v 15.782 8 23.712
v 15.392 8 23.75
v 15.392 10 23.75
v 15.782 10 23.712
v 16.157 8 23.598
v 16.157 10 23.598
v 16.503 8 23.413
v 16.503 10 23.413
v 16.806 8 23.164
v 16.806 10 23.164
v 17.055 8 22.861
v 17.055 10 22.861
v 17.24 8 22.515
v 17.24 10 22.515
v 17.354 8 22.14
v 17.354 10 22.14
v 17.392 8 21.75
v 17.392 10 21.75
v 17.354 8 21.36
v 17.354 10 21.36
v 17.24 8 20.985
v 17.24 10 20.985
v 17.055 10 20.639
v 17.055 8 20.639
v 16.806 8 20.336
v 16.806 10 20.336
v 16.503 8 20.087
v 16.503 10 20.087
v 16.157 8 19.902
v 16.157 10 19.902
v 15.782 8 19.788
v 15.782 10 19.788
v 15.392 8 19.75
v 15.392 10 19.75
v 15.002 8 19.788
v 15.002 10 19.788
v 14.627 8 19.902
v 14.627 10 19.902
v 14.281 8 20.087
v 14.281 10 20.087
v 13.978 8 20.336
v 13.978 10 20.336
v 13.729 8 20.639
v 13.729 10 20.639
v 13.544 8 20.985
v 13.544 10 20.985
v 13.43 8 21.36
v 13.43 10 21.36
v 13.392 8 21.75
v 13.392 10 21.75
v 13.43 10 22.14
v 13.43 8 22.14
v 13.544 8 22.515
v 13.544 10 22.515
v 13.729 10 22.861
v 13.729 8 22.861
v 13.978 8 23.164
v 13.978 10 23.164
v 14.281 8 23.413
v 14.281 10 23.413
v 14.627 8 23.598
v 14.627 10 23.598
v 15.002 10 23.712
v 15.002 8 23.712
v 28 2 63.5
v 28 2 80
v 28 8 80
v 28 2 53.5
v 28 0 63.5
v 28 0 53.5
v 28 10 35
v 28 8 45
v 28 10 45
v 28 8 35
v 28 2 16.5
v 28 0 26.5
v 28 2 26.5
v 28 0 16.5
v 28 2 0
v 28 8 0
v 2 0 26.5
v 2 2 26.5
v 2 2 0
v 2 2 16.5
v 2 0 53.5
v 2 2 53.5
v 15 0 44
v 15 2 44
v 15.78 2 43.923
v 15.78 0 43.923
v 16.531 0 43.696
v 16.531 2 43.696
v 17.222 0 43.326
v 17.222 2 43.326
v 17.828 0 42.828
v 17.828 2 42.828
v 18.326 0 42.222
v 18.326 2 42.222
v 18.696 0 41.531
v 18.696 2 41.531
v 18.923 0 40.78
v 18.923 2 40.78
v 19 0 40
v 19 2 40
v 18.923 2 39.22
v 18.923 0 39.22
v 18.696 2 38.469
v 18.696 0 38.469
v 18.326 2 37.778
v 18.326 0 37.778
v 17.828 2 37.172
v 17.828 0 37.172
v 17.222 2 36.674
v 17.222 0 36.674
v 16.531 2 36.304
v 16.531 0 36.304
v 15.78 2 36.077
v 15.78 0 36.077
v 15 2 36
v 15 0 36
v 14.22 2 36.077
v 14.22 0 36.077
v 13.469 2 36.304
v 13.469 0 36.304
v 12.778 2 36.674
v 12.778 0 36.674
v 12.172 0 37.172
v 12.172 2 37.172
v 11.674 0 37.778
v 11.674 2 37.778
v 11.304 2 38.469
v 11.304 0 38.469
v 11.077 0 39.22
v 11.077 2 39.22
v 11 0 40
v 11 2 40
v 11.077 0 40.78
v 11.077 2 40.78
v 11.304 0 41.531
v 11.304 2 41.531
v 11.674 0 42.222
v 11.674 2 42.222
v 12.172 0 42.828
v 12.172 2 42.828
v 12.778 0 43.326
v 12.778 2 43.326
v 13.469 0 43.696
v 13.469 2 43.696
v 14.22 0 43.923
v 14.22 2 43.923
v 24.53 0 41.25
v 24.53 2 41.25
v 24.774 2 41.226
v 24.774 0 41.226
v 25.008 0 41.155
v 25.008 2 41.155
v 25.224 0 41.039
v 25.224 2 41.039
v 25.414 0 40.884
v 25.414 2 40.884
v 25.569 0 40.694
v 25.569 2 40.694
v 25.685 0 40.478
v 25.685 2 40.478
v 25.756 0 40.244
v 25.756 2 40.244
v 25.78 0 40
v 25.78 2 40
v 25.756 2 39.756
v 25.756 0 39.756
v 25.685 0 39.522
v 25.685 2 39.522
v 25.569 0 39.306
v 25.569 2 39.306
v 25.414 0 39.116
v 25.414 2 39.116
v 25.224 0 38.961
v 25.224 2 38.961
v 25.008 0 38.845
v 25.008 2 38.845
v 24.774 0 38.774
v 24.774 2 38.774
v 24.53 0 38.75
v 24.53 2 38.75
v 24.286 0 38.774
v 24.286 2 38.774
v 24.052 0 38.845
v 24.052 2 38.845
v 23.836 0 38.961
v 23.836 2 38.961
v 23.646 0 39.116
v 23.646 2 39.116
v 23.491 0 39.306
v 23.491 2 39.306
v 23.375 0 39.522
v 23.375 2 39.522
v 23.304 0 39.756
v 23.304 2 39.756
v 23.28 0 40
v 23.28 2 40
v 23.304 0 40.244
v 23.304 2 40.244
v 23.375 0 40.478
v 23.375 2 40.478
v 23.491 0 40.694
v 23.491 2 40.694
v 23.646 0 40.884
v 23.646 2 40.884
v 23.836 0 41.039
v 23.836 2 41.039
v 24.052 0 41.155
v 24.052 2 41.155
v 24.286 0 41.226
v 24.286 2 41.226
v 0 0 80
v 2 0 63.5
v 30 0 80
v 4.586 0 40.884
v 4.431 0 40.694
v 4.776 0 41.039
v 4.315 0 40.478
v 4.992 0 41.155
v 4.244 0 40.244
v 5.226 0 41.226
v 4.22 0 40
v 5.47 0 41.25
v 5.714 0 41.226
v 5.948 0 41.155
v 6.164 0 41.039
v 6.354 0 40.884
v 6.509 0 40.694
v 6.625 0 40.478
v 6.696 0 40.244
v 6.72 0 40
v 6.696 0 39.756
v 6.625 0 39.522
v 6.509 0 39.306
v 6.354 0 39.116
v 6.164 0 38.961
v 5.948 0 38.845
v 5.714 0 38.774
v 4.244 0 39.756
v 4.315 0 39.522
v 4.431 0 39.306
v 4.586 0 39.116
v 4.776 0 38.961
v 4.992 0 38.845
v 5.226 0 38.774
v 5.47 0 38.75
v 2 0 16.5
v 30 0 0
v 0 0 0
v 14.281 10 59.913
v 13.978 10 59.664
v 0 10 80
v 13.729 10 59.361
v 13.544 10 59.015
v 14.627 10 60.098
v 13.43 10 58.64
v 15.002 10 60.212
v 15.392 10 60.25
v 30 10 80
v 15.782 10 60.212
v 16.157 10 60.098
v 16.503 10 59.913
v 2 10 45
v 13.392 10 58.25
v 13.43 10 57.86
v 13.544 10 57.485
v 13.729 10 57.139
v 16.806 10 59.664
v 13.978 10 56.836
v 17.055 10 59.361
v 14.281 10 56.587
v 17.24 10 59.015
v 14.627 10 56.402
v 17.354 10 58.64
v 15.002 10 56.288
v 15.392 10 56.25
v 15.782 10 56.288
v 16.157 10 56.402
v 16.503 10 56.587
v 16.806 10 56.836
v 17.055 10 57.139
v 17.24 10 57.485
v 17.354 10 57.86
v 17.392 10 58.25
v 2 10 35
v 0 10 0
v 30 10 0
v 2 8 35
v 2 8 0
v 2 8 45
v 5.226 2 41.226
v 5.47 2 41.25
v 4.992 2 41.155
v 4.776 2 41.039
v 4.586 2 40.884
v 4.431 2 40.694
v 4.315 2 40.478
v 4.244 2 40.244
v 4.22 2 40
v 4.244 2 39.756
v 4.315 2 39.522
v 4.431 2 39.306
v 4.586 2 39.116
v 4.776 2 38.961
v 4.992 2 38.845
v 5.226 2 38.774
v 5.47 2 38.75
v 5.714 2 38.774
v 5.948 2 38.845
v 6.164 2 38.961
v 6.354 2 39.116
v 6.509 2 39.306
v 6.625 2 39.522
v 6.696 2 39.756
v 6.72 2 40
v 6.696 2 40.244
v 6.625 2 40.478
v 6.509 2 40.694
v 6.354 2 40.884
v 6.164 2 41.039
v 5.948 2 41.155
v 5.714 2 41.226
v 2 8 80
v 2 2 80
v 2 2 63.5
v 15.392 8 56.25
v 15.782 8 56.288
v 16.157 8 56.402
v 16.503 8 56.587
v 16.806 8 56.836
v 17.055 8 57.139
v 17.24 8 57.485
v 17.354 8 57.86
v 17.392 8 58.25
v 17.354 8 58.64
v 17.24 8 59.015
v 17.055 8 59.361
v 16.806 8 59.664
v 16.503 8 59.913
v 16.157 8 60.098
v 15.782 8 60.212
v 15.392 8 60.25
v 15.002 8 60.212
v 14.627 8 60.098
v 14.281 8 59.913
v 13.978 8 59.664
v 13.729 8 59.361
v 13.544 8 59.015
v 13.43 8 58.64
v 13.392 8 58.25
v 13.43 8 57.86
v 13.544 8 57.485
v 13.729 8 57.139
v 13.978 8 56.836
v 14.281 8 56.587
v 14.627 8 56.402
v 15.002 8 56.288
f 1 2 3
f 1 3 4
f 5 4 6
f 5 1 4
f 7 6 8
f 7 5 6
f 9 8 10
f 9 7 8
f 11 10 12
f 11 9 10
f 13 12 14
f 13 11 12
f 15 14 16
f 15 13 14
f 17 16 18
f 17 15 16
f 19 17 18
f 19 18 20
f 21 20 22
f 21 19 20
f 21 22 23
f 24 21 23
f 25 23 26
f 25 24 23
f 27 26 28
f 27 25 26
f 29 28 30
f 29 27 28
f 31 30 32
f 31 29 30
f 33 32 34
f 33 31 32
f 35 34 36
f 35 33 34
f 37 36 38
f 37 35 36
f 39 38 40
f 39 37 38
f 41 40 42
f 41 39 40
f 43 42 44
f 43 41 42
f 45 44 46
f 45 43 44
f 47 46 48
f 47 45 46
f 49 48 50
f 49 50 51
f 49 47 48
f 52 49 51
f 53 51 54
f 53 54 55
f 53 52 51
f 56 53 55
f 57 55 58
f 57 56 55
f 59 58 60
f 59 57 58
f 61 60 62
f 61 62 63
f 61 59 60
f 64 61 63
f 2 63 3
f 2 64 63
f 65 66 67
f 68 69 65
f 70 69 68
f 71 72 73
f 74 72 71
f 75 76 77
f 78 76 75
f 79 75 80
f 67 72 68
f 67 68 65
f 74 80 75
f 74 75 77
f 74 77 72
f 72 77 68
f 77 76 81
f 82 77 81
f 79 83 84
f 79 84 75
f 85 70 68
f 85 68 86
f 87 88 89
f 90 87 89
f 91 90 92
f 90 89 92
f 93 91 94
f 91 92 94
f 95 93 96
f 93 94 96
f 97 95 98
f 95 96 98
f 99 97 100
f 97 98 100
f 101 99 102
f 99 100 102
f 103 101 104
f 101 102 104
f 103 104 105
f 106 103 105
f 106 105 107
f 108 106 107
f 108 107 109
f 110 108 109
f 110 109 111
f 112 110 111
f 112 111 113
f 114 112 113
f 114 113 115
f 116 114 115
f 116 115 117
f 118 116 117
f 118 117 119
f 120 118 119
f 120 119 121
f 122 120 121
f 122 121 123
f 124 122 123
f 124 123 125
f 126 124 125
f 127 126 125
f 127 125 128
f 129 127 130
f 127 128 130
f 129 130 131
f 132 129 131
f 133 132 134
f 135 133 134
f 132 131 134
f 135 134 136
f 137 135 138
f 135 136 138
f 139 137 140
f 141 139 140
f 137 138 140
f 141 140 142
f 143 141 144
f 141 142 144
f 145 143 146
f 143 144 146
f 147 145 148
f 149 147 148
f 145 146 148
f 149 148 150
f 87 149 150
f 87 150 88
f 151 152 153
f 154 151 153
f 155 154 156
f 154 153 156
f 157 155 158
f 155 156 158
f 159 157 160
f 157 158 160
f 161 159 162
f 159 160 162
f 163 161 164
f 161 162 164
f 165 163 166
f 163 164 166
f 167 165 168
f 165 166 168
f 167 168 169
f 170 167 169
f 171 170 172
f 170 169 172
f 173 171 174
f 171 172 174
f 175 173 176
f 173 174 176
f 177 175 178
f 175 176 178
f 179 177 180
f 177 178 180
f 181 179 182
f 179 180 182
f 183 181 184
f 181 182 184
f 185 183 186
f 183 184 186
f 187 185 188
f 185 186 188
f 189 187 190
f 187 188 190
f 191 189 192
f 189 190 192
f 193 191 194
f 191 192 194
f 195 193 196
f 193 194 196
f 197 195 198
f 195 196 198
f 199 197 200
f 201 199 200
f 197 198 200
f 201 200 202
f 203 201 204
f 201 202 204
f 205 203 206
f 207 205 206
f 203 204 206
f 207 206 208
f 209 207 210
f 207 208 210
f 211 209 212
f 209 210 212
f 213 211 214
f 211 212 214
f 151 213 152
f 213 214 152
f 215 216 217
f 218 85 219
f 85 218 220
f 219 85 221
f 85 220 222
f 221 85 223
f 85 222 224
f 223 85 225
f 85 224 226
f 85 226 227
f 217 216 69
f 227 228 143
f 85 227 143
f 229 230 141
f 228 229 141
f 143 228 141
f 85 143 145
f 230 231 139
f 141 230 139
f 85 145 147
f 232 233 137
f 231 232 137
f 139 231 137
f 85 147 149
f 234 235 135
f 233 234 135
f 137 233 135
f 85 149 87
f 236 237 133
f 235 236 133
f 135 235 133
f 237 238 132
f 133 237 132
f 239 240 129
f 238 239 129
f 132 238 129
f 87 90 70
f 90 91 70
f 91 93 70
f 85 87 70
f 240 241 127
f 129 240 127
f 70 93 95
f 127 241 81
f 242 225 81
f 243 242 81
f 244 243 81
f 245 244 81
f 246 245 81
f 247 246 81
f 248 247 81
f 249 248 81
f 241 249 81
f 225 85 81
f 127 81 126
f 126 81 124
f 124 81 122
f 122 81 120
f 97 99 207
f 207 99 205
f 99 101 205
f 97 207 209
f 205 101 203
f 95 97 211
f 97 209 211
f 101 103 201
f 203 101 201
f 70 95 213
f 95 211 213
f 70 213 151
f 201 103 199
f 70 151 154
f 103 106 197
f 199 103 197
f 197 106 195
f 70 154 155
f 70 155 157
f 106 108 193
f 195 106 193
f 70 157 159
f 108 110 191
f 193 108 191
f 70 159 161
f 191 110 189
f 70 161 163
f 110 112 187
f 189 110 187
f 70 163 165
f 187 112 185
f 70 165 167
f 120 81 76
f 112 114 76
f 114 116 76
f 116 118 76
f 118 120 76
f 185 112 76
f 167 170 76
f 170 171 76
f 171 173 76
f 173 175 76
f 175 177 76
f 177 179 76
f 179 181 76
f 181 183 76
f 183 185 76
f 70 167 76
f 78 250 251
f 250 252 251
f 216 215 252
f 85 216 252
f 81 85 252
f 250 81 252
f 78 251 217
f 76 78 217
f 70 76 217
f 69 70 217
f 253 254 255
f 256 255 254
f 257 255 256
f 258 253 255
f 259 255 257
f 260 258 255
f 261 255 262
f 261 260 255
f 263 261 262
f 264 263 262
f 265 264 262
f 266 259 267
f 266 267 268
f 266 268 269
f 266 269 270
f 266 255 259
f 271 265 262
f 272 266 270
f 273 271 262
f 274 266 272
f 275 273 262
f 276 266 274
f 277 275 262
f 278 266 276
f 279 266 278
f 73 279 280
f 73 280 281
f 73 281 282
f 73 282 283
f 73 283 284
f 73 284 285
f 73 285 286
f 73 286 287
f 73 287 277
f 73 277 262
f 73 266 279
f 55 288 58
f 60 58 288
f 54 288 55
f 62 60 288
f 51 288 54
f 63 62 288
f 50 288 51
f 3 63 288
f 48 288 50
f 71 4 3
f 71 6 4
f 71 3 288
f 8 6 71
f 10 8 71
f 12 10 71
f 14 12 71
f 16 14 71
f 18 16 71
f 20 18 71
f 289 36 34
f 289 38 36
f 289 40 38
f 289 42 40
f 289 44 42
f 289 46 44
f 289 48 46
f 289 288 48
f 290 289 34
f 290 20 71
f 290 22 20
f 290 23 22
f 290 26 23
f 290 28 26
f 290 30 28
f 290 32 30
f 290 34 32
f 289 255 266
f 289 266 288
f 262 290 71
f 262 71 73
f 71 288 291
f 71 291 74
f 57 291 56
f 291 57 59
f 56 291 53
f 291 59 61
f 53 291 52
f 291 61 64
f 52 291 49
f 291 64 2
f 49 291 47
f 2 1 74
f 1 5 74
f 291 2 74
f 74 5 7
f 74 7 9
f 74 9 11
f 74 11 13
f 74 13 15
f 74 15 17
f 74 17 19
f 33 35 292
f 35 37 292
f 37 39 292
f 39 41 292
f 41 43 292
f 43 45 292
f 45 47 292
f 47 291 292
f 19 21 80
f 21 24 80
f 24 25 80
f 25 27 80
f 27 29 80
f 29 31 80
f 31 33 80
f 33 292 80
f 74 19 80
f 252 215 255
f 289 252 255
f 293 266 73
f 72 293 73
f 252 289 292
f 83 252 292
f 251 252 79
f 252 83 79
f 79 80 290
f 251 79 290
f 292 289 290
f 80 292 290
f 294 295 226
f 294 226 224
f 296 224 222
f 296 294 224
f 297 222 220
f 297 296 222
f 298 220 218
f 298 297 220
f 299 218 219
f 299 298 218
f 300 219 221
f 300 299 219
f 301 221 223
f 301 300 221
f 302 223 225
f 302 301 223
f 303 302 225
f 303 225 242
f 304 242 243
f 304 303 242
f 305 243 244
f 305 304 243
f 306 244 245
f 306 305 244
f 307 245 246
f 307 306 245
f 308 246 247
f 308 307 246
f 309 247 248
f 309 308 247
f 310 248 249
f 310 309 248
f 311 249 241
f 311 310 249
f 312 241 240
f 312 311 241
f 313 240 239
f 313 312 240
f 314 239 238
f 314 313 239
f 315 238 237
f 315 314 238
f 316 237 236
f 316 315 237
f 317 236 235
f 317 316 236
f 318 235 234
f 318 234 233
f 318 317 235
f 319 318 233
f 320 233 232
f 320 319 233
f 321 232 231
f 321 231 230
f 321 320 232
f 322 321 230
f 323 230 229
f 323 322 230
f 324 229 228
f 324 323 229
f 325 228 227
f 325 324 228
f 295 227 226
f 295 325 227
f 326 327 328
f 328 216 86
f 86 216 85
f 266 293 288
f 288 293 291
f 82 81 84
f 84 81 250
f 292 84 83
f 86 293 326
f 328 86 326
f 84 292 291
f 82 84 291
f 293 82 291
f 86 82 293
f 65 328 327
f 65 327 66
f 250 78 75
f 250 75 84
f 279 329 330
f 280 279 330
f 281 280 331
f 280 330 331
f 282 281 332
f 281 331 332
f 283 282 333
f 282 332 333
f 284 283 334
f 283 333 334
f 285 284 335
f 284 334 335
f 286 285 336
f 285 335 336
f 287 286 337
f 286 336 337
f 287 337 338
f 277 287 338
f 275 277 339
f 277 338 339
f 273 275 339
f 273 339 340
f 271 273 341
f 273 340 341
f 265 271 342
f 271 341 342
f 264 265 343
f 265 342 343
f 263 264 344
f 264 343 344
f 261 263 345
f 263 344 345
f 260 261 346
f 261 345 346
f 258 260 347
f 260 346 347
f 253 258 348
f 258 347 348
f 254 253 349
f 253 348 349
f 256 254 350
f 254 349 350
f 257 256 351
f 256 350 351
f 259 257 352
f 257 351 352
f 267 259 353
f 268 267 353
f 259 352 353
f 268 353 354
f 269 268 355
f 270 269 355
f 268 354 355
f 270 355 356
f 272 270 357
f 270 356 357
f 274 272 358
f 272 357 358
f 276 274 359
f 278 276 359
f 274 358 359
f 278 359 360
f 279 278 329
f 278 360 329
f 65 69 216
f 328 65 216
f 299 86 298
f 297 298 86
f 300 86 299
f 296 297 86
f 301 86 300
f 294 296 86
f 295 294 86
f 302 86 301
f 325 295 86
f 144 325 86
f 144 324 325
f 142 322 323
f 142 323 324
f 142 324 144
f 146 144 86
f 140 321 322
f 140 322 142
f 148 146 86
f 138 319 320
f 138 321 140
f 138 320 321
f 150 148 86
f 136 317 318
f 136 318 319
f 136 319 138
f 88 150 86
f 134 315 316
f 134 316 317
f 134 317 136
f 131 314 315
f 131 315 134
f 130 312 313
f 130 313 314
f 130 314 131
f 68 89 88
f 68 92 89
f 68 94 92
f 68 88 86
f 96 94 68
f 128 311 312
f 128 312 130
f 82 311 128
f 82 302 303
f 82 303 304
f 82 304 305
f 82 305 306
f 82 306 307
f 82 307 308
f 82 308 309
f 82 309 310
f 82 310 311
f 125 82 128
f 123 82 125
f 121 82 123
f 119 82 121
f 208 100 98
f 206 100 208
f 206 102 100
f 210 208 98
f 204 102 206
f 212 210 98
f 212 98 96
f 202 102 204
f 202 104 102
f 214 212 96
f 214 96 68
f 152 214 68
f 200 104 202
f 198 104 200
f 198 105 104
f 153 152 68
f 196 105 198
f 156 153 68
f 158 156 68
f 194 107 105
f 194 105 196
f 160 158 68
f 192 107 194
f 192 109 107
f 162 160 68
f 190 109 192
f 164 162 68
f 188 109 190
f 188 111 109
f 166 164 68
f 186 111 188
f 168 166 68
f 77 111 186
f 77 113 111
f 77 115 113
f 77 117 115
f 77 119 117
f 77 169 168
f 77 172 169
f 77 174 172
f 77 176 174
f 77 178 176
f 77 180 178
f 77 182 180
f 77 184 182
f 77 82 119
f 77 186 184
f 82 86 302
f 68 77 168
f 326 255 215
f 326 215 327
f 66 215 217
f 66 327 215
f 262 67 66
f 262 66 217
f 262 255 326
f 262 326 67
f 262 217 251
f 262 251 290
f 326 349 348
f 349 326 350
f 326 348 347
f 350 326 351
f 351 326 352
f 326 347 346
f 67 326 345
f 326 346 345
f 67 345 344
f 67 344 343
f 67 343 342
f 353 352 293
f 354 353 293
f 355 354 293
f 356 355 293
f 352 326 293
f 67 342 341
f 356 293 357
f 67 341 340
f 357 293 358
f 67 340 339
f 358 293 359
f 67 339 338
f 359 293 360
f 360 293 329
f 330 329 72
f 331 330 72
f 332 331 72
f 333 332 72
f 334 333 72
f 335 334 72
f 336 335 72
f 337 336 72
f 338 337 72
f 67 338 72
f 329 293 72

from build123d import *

# Parameters (mm, degrees)
ESBO_O1_W                = 30
ESBO_O1_H                = 10
ESBO_O1_W_2              = 26
ESBO_O1_H_2              = 6
RESSALTO_EXTRUS_O1_DEPTH = 80
ESBO_O2_R                = 4
CORTE_EXTRUS_O1_DEPTH    = 10
ESBO_O3_W                = 26
ESBO_O3_H                = 10
CORTE_EXTRUS_O2_DEPTH    = 2
ESBO_O5_W                = 26
ESBO_O5_H                = 10
CORTE_EXTRUS_O3_DEPTH    = 2
ESBO_O6_R                = 2
CORTE_EXTRUS_O4_DEPTH    = 2
ESBO_O7_R                = 1.25
CORTE_EXTRUS_O5_DEPTH    = 2


with BuildPart() as part:
    # Esboço1 → Ressalto-extrusão1 (new body)
    with BuildSketch(Plane.XY):
        with Locations((15, 5)):
            Rectangle(ESBO_O1_W, ESBO_O1_H)
        with Locations((15, 5)):
            Rectangle(ESBO_O1_W_2, ESBO_O1_H_2, mode=Mode.SUBTRACT)
    extrude(amount=RESSALTO_EXTRUS_O1_DEPTH)

    # Esboço2 → Corte-extrusão1 (cut)
    with BuildSketch(Plane(origin=(0, 10, 0), x_dir=(1, 0, 0), z_dir=(0, 1, 0))):
        with Locations(Location((15, -40, 0), (0, 0, 270))):
            Circle(ESBO_O2_R)
    extrude(amount=-CORTE_EXTRUS_O1_DEPTH, mode=Mode.SUBTRACT)

    # Esboço3 → Corte-extrusão2 (cut)
    with BuildSketch(Plane(origin=(0, 10, 0), x_dir=(1, 0, 0), z_dir=(0, 1, 0))):
        with Locations((15, -40)):
            Rectangle(ESBO_O3_W, ESBO_O3_H)
    extrude(amount=-CORTE_EXTRUS_O2_DEPTH, mode=Mode.SUBTRACT)

    # Esboço5 → Corte-extrusão3 (cut)
    with BuildSketch(Plane(origin=(0, 0, 0), x_dir=(-1, 0, 0), z_dir=(0, -1, 0))):
        with Locations((-15, -58.5)):
            Rectangle(ESBO_O5_W, ESBO_O5_H)
    corte_extrus_o3 = extrude(amount=-CORTE_EXTRUS_O3_DEPTH, mode=Mode.SUBTRACT)

    # Esboço6 → Corte-extrusão4 (cut)
    with BuildSketch(Plane(origin=(0, 8, 0), x_dir=(-1, 0, 0), z_dir=(0, -1, 0))):
        with Locations(Location((-15.391952085, -58.25, 0), (0, 0, 90))):
            Circle(ESBO_O6_R)
    corte_extrus_o4 = extrude(amount=-CORTE_EXTRUS_O4_DEPTH, mode=Mode.SUBTRACT)

    # Espelhar6: Corte-extrusão3, Corte-extrusão4 across plane
    add(corte_extrus_o3.mirror(Plane(origin=(0, 0, 40), x_dir=(1, 0, 0), z_dir=(0, 0, -1))), mode=Mode.SUBTRACT)
    add(corte_extrus_o4.mirror(Plane(origin=(0, 0, 40), x_dir=(1, 0, 0), z_dir=(0, 0, -1))), mode=Mode.SUBTRACT)

    # Esboço7 → Corte-extrusão5 (cut)
    with BuildSketch(Plane(origin=(0, 2, 0), x_dir=(1, 0, 0), z_dir=(0, 1, 0))):
        with Locations(Location((24.53, -40, 0), (0, 0, 270))):
            Circle(ESBO_O7_R)
    corte_extrus_o5 = extrude(amount=-CORTE_EXTRUS_O5_DEPTH, mode=Mode.SUBTRACT)

    # Espelhar7: Corte-extrusão5 across plane
    add(corte_extrus_o5.mirror(Plane.ZY.offset(-15)), mode=Mode.SUBTRACT)


solid = part.part
